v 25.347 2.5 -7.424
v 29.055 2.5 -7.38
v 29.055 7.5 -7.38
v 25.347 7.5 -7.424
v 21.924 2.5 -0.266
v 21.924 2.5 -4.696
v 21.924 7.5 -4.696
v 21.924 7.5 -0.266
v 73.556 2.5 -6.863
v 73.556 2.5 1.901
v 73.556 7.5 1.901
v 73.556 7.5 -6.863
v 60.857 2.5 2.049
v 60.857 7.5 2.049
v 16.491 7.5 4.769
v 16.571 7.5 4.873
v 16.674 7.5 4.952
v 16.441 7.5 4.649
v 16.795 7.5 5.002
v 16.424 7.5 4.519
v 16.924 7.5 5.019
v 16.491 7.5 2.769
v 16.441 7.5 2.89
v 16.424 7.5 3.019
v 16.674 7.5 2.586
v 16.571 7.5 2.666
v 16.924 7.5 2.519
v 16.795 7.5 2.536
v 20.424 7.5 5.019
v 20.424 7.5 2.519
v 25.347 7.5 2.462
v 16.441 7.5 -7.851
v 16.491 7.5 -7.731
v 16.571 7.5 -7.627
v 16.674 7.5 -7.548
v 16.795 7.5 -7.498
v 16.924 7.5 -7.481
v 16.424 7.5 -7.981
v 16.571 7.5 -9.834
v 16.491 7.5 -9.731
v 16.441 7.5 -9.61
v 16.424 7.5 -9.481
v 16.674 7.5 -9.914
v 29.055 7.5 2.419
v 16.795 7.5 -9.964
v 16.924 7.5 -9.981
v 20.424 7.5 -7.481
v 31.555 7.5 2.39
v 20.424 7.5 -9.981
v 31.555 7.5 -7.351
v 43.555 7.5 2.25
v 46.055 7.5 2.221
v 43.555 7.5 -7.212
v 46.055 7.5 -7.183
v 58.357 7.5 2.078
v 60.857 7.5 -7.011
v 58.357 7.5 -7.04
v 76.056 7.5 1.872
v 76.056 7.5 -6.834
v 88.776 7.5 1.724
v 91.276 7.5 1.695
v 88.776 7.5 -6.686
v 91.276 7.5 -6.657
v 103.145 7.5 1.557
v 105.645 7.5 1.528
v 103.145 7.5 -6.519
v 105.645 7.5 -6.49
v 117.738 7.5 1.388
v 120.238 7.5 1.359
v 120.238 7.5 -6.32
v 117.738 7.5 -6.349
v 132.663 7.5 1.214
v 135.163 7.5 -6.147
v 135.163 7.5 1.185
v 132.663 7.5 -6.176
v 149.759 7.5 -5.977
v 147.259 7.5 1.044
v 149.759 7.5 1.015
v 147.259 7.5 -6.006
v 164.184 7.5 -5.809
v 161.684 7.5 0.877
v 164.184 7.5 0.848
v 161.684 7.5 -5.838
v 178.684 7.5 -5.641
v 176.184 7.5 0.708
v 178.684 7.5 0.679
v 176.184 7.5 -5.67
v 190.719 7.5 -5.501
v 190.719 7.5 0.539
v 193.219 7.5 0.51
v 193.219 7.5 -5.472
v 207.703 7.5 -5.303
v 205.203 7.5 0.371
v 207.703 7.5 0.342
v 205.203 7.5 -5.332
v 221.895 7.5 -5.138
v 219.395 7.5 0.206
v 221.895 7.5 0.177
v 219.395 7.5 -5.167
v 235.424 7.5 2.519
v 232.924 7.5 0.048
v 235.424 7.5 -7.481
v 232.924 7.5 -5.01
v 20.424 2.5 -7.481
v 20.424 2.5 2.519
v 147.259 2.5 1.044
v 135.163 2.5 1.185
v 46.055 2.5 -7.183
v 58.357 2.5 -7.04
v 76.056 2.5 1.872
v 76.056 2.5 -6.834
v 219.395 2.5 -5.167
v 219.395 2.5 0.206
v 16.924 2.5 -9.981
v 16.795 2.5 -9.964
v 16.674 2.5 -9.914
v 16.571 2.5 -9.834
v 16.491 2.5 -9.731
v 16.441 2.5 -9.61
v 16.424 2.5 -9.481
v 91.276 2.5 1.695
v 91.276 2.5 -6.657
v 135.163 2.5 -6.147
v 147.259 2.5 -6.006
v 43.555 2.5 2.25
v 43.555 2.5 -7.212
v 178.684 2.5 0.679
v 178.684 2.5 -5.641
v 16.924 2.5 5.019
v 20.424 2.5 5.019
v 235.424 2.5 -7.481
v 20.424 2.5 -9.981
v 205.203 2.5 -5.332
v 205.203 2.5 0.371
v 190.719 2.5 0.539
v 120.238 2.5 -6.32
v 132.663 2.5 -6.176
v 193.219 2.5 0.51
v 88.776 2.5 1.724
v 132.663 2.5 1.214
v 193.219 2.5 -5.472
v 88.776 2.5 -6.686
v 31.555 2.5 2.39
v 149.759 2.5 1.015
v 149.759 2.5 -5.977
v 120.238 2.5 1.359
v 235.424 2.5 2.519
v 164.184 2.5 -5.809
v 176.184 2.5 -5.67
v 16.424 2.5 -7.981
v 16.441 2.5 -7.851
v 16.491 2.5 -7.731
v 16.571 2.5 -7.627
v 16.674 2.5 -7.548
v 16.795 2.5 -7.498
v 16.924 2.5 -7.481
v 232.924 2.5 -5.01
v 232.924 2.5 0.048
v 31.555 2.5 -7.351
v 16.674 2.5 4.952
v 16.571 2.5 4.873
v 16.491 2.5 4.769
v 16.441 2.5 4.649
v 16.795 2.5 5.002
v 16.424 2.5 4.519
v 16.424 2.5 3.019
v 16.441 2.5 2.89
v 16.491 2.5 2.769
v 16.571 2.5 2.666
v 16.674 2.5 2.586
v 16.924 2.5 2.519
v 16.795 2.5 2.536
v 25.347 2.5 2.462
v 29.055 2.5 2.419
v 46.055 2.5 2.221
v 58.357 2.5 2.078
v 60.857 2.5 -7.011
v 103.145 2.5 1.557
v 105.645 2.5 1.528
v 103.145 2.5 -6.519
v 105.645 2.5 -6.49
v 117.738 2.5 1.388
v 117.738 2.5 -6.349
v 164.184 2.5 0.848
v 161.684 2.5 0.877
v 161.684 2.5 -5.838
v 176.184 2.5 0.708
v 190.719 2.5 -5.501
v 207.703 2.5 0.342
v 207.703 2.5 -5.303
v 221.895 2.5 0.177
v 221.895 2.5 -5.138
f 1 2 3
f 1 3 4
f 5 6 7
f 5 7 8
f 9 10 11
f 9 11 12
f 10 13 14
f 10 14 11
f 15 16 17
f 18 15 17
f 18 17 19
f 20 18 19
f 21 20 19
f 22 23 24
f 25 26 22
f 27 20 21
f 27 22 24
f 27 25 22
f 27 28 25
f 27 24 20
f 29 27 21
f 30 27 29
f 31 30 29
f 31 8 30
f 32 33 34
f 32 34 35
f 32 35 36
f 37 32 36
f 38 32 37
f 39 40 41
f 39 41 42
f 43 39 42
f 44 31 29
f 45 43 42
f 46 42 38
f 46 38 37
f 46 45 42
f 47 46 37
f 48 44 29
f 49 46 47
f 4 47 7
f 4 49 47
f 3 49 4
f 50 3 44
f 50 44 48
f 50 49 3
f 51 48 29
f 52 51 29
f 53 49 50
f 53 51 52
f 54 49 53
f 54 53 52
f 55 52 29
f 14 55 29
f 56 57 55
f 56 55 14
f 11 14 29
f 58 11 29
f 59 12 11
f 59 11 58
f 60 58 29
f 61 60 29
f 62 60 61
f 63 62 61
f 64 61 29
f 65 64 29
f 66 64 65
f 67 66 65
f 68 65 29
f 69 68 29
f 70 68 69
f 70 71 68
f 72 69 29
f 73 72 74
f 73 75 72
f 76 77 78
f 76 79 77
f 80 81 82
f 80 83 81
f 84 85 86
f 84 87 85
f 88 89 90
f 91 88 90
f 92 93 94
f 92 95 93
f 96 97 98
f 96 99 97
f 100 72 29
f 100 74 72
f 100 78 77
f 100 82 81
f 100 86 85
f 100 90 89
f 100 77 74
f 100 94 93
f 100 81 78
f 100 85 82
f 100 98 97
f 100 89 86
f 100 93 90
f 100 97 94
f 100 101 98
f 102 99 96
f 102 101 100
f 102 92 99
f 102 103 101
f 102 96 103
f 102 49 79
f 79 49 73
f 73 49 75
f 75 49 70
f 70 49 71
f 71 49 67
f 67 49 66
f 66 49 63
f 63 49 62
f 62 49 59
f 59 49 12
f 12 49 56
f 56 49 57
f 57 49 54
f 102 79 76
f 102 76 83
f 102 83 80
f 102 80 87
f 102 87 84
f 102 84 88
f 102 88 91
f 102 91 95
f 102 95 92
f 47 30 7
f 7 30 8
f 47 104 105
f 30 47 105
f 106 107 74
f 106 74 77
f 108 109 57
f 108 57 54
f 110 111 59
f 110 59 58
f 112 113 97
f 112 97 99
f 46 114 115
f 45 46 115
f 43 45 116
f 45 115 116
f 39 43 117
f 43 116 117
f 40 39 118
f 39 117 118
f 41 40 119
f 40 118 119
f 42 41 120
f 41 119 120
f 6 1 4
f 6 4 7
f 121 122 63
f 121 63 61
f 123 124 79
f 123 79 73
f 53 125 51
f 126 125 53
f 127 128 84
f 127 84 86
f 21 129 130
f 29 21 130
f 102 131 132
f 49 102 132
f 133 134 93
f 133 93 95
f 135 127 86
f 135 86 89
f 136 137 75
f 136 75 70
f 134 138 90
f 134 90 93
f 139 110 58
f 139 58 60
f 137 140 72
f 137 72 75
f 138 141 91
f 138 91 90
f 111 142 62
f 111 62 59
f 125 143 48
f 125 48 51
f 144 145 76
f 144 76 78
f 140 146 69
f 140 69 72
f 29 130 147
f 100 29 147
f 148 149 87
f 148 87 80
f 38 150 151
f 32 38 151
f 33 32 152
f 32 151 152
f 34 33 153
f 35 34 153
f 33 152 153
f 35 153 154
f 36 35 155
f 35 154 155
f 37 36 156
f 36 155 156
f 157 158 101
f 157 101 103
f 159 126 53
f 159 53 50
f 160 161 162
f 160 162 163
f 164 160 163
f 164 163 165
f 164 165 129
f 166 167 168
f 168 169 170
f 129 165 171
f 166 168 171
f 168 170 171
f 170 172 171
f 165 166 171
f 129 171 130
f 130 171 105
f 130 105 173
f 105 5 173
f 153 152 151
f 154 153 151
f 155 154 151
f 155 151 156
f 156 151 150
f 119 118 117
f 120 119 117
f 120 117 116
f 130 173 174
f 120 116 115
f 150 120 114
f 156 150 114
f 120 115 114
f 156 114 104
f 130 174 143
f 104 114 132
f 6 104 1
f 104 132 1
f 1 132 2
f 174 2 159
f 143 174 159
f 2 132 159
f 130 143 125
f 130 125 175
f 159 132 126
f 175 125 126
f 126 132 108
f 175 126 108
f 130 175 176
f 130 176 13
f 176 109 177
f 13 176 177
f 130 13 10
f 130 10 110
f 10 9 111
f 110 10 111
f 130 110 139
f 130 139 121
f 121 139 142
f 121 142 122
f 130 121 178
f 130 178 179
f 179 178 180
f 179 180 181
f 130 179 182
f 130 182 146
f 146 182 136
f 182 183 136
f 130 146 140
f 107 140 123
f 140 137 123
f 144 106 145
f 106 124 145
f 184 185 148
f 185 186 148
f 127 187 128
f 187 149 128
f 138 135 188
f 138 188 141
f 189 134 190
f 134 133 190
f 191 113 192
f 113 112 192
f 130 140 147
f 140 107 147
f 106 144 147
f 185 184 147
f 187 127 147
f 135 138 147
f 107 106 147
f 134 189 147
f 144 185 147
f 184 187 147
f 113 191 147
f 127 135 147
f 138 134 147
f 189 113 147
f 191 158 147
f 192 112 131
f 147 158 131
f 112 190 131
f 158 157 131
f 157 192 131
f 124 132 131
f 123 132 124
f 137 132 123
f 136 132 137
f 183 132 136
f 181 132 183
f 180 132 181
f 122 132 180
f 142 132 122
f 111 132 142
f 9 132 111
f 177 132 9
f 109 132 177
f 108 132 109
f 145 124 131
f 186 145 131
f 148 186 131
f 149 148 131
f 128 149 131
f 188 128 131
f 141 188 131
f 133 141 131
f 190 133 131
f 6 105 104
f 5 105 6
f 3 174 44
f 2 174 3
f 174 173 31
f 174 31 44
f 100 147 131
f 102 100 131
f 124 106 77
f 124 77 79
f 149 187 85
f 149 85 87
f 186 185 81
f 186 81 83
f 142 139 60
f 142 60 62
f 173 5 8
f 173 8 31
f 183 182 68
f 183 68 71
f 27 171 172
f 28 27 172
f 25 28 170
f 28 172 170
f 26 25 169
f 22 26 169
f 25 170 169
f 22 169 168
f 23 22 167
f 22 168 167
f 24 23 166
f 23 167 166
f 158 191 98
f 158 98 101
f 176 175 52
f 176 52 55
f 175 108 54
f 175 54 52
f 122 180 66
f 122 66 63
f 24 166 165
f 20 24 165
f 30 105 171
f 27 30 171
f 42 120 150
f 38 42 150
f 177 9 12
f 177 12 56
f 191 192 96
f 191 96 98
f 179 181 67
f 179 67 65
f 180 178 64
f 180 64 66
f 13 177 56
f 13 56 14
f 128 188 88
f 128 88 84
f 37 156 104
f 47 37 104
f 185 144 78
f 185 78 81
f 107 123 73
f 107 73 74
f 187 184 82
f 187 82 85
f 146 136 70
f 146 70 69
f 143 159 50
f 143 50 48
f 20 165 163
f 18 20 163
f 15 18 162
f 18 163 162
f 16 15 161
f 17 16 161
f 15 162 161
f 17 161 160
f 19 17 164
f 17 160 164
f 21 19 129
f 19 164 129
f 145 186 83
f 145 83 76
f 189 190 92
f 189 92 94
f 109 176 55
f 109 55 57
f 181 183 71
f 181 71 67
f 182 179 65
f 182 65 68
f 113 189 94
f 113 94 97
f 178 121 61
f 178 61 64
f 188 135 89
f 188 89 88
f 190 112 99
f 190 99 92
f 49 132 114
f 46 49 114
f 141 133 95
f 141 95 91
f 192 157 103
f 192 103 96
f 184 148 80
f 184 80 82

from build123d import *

# Parameters (mm, degrees)
SALIENTE_EXTRUIR2_DEPTH = 10
ESCALA1_SCALE           = 0.5


with BuildPart() as part:
    # Croquis1 → Saliente-Extruir2 (new body)
    with BuildSketch(Plane(origin=(0, 0, 0), x_dir=(1, 0, 0), z_dir=(0, 1, 0))):
        with BuildLine():
            Line((347.768463119, -7.519240019), (347.768463119, 12.480759981))
            Line((347.768463119, 12.480759981), (-82.231536881, 17.480759981))
            Line((-82.231536881, 17.480759981), (-89.231536881, 17.480759981))
            ThreePointArc((-89.231536881, 17.480759981), (-89.938643662, 17.187866762), (-90.231536881, 16.480759981))
            Line((-90.231536881, 16.480759981), (-90.231536881, 13.480759981))
            ThreePointArc((-90.231536881, 13.480759981), (-89.938643662, 12.7736532), (-89.231536881, 12.480759981))
            Line((-89.231536881, 12.480759981), (-82.231536881, 12.480759981))
            Line((-82.231536881, 12.480759981), (-82.231536881, -7.519240019))
            Line((-82.231536881, -7.519240019), (-89.231536881, -7.519240019))
            ThreePointArc((-89.231536881, -7.519240019), (-89.938643662, -7.812133238), (-90.231536881, -8.519240019))
            Line((-90.231536881, -8.519240019), (-90.231536881, -11.519240019))
            ThreePointArc((-90.231536881, -11.519240019), (-89.938643662, -12.2263468), (-89.231536881, -12.519240019))
            Line((-89.231536881, -12.519240019), (-82.231536881, -12.519240019))
            Line((-82.231536881, -12.519240019), (347.768463119, -7.519240019))
        make_face()
        Polygon((-35.970310827, -6.981318786), (-35.970310827, 11.942838748), (-59.970310827, 12.221908515), (-59.970310827, -7.260388554), align=None, mode=Mode.SUBTRACT)
        Polygon((-6.36676246, -6.637091479), (-6.36676246, 11.598611441), (-30.970310827, 11.884699213), (-30.970310827, -6.923179251), align=None, mode=Mode.SUBTRACT)
        Polygon((24.032508683, -6.283611582), (24.032508683, 11.245131544), (-1.36676246, 11.540471906), (-1.36676246, -6.578951945), align=None, mode=Mode.SUBTRACT)
        Polygon((54.471653082, -5.929668043), (54.471653082, 10.891188004), (29.032508683, 11.186992009), (29.032508683, -6.225472048), align=None, mode=Mode.SUBTRACT)
        Polygon((83.209124846, -5.595511395), (83.209124846, 10.557031356), (59.471653082, 10.83304847), (59.471653082, -5.871528508), align=None, mode=Mode.SUBTRACT)
        Polygon((112.395607474, -5.25613369), (112.395607474, 10.217653651), (88.209124846, 10.498891821), (88.209124846, -5.53737186), align=None, mode=Mode.SUBTRACT)
        Polygon((142.246515855, -4.909030104), (142.246515855, 9.870550065), (117.395607474, 10.159514116), (117.395607474, -5.197994155), align=None, mode=Mode.SUBTRACT)
        Polygon((171.437834583, -4.569596165), (171.437834583, 9.531116127), (147.246515855, 9.81241053), (147.246515855, -4.850890569), align=None, mode=Mode.SUBTRACT)
        Polygon((200.288401316, -4.234124459), (200.288401316, 9.19564442), (176.437834583, 9.472976592), (176.437834583, -4.51145663), align=None, mode=Mode.SUBTRACT)
        Polygon((229.28834427, -3.89691582), (229.28834427, 8.858435781), (205.288401316, 9.137504885), (205.288401316, -4.175984924), align=None, mode=Mode.SUBTRACT)
        Polygon((258.357613703, -3.558901059), (258.357613703, 8.52042102), (234.28834427, 8.800296246), (234.28834427, -3.838776285), align=None, mode=Mode.SUBTRACT)
        Polygon((287.325919365, -3.222060295), (287.325919365, 8.183580257), (263.357613703, 8.462281486), (263.357613703, -3.500761524), align=None, mode=Mode.SUBTRACT)
        Polygon((315.709556101, -2.892018008), (315.709556101, 7.853537969), (292.325919365, 8.125440722), (292.325919365, -3.163920761), align=None, mode=Mode.SUBTRACT)
        Polygon((342.768463119, -2.577379554), (342.768463119, 7.538899516), (320.709556101, 7.795398434), (320.709556101, -2.833878473), align=None, mode=Mode.SUBTRACT)
        Polygon((-64.970310827, -7.318528088), (-64.970310827, 12.28004805), (-72.387230354, 12.3662913), (-79.231536881, 6.910670608), (-79.231536881, -1.949150646), (-72.387230358, -7.404771339), align=None, mode=Mode.SUBTRACT)
    extrude(amount=SALIENTE_EXTRUIR2_DEPTH)


with BuildPart() as part_1:
    # Escala1: scaled about (123.080377325, 5, -2.480759981)
    add(part.part.scale(ESCALA1_SCALE).moved(Location((61.540188663, 2.5, -1.24037999))))


solid = part_1.part
